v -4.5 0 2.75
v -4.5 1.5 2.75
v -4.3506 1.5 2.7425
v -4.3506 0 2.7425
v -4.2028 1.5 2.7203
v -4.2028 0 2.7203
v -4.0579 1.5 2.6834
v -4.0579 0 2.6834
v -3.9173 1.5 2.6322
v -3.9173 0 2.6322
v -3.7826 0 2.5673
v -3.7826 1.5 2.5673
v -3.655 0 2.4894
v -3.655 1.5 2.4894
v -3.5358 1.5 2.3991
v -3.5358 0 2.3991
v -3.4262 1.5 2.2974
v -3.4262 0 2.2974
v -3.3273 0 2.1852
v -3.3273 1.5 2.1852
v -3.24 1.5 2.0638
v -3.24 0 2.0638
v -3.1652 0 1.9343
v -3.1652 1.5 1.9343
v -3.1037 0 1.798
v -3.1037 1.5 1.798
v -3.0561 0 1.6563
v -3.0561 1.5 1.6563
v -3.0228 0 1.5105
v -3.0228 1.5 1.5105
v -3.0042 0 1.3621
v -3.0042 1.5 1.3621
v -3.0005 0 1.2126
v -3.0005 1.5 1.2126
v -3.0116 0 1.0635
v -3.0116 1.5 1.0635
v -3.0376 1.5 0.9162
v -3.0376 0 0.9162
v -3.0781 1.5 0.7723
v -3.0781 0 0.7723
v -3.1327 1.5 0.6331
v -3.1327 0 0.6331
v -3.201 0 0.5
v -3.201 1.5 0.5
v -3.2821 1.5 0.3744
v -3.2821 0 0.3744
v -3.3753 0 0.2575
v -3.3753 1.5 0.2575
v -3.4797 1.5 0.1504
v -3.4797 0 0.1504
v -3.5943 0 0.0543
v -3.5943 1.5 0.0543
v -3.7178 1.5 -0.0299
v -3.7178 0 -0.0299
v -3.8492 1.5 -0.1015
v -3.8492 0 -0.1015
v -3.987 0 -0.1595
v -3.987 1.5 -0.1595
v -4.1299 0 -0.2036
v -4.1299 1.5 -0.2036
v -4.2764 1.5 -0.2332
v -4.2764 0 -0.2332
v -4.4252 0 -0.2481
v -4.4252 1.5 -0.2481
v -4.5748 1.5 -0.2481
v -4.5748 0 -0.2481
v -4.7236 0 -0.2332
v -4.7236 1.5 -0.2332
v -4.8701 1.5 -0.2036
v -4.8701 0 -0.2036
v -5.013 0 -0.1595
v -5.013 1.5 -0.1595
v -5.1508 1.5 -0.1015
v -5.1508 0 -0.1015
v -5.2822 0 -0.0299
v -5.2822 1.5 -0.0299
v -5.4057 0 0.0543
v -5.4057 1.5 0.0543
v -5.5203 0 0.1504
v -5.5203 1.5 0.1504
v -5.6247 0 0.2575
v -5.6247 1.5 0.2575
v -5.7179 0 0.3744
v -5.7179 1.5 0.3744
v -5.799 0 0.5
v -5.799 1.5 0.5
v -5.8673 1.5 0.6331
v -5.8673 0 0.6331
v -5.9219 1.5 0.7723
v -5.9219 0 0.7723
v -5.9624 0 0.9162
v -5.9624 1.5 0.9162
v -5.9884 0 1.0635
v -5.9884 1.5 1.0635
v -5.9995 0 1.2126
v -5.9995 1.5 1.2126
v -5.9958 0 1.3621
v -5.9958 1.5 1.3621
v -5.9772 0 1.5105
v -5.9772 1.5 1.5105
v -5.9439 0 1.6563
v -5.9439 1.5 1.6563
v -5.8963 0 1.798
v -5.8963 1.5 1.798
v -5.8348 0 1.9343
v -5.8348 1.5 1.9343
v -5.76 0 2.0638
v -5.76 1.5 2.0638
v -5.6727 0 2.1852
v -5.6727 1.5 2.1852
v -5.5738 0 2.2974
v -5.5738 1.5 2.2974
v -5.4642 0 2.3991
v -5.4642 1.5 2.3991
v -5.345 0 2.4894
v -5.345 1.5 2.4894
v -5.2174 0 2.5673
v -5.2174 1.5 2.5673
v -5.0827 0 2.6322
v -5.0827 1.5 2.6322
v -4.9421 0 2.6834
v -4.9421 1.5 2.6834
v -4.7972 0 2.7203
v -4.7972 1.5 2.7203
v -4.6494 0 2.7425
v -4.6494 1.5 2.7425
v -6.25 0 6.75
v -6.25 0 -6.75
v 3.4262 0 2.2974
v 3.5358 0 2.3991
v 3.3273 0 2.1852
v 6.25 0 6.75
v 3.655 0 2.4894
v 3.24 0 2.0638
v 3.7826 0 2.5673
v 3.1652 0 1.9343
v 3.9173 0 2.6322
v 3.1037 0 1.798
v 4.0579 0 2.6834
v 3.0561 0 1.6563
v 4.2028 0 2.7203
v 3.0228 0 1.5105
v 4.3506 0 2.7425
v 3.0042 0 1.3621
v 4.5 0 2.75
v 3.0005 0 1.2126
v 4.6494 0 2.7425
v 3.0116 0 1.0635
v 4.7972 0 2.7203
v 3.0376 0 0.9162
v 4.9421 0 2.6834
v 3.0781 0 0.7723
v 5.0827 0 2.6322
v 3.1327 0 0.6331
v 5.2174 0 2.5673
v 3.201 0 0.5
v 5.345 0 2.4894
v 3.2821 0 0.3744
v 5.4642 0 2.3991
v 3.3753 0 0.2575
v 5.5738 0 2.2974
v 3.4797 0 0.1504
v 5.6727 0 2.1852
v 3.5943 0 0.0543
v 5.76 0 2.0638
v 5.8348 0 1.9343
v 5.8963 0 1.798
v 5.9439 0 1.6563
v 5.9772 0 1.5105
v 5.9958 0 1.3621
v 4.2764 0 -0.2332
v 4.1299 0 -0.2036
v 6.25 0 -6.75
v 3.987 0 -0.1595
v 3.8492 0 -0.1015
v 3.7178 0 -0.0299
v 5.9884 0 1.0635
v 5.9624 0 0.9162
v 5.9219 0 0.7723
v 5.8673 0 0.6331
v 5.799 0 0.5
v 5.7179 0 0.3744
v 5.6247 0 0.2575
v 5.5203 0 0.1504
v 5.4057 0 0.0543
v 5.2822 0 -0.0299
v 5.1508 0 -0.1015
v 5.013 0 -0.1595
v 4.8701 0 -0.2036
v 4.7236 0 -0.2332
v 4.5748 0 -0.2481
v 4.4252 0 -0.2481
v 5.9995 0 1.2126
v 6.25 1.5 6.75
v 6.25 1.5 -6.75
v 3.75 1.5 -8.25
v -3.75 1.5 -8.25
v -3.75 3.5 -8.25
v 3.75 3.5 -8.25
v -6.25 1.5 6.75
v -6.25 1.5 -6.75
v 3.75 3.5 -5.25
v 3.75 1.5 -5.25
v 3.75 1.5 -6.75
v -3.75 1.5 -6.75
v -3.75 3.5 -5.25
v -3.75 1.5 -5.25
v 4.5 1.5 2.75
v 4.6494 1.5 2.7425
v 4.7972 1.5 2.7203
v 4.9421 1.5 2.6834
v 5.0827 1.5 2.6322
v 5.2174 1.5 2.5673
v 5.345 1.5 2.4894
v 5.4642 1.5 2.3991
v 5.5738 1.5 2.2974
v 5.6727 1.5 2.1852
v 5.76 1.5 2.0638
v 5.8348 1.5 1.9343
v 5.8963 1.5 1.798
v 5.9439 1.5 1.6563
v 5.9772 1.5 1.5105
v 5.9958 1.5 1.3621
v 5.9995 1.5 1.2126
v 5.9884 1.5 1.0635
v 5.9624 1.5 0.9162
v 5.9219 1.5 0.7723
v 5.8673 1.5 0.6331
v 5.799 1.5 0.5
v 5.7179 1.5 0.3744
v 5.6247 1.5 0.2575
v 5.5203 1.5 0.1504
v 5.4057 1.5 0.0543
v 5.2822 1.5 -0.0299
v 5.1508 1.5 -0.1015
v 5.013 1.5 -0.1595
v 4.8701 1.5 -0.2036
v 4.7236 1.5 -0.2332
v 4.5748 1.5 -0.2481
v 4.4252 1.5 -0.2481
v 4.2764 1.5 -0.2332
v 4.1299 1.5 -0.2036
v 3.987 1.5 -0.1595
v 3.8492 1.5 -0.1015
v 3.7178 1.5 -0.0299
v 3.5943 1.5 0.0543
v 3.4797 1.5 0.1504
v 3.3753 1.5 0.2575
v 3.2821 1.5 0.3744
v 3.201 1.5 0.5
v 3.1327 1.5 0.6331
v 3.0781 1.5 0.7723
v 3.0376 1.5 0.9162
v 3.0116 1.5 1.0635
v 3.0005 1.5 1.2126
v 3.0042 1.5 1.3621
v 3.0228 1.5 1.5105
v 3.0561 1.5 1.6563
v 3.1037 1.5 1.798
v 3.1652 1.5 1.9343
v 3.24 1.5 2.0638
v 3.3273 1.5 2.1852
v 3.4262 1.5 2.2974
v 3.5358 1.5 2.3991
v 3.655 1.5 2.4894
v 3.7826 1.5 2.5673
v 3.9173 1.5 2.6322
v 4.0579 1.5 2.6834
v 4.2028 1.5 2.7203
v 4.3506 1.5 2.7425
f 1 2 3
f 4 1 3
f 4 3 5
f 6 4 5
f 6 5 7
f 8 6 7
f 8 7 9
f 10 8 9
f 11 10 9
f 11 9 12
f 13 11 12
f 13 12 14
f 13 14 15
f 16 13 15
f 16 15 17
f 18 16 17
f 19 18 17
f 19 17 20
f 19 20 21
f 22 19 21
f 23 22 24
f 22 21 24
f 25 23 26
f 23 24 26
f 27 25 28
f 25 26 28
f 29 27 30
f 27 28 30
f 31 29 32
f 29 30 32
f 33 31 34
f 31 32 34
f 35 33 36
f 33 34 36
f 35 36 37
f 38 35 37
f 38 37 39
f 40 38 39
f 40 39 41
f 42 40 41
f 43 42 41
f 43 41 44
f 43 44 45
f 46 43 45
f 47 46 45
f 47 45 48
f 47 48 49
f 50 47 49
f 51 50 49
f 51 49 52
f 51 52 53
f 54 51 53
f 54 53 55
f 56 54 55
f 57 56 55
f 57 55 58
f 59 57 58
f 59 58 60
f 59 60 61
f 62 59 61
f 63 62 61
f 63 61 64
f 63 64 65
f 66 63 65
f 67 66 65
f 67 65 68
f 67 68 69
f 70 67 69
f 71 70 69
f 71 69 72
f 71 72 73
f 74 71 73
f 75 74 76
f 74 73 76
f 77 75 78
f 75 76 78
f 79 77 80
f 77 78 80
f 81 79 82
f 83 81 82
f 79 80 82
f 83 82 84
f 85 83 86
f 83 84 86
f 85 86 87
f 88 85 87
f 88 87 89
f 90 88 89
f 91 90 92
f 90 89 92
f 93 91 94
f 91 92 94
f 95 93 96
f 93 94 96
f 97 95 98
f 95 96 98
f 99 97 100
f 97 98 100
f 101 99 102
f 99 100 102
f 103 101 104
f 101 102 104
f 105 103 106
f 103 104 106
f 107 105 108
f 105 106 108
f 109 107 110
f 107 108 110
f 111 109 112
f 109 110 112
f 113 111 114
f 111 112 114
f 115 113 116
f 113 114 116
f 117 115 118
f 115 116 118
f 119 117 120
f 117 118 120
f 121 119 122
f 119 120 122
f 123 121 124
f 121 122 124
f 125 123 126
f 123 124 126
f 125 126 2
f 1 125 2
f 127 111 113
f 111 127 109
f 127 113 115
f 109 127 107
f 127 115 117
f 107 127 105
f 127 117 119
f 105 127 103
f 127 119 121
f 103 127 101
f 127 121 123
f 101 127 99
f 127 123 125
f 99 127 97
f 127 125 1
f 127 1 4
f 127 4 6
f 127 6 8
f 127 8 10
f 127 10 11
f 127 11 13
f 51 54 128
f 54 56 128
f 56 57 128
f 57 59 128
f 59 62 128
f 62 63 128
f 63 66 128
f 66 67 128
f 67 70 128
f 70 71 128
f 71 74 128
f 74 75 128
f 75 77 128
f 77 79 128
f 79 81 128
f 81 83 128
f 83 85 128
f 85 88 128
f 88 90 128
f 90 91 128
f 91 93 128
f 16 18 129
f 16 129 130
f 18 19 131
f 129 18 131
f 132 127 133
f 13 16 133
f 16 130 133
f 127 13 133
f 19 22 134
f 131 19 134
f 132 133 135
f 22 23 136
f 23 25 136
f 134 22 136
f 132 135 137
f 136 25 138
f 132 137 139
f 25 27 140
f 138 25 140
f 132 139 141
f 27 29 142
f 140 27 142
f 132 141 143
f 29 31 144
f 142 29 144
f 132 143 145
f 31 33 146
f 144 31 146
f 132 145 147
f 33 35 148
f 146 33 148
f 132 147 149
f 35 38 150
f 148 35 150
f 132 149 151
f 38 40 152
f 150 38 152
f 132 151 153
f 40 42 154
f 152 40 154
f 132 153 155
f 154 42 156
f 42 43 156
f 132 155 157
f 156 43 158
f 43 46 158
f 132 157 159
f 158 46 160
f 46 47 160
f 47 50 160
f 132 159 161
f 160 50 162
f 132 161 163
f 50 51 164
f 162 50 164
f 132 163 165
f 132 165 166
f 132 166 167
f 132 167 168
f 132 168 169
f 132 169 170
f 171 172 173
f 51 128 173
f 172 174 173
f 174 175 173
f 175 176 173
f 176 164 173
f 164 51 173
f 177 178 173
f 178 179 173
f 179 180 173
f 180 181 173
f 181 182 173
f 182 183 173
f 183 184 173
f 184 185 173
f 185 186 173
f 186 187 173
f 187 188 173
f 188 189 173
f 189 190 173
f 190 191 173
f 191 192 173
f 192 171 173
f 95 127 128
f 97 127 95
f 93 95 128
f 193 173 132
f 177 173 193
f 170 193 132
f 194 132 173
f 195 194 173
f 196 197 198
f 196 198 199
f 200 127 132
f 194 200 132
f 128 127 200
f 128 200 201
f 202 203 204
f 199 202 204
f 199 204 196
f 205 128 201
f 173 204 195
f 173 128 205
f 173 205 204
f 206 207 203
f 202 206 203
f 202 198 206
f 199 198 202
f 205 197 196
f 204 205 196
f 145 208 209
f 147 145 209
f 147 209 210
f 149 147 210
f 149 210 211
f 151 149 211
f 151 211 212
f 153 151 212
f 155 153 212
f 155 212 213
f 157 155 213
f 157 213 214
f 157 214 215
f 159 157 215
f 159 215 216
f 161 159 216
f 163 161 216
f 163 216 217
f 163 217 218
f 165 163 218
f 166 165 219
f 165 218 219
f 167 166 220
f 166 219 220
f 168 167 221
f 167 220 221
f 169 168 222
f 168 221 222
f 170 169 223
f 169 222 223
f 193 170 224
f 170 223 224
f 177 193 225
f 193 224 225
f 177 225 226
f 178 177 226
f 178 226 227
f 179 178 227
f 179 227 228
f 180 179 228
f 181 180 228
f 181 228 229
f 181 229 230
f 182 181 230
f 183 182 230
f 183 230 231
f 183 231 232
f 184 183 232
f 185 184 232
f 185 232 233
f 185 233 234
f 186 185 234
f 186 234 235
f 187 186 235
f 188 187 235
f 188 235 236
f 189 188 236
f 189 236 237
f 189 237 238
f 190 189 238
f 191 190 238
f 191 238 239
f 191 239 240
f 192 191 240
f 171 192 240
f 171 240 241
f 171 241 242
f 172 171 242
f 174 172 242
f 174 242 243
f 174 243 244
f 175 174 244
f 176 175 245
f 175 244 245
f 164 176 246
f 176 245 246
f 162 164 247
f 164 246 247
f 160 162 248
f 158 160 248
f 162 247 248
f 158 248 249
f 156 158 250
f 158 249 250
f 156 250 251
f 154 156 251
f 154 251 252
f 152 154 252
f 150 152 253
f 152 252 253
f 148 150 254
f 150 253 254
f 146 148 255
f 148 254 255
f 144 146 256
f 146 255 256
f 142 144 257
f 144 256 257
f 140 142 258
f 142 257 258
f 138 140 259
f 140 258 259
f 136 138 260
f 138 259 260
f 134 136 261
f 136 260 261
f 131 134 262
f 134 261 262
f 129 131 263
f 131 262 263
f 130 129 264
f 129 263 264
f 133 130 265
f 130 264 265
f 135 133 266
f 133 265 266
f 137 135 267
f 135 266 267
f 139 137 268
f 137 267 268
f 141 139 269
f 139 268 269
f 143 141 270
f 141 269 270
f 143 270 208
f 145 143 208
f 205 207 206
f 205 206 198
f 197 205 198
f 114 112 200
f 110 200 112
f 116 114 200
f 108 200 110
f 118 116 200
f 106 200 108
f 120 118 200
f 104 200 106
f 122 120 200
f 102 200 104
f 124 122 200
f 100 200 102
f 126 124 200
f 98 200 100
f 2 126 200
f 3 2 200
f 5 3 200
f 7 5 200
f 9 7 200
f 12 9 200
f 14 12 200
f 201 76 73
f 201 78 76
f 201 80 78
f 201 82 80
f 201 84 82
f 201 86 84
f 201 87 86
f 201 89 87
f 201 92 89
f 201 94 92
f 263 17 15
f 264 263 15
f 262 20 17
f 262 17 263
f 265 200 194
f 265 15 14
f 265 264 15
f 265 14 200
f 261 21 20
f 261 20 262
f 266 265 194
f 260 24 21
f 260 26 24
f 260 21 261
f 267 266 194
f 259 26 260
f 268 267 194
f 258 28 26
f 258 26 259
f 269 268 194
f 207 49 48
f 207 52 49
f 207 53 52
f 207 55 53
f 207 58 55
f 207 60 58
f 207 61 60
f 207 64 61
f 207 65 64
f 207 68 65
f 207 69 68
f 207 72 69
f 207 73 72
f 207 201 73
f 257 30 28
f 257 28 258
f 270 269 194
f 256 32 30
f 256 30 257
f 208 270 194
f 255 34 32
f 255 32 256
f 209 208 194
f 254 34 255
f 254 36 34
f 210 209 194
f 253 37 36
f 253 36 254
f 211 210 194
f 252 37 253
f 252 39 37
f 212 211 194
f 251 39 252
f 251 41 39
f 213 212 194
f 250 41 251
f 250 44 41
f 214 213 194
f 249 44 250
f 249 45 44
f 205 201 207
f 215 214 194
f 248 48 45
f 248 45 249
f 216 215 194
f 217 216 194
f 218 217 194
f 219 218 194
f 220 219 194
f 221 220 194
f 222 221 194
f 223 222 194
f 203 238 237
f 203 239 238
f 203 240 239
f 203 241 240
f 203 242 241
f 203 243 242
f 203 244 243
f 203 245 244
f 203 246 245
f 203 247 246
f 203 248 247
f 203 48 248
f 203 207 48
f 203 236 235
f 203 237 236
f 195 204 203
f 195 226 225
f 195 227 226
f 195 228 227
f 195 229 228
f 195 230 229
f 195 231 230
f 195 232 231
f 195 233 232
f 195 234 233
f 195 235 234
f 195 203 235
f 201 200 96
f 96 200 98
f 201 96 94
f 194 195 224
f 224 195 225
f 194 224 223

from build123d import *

# Parameters (mm, degrees)
SKETCH1_W           = 12.5
SKETCH1_H           = 13.5
BOSS_EXTRUDE1_DEPTH = 1.5
SKETCH2_W           = 7.5
SKETCH2_H           = 3
BOSS_EXTRUDE2_DEPTH = 2
SKETCH3_R           = 1.5
CUT_EXTRUDE4_DEPTH  = 11.541584321


with BuildPart() as part:
    # Sketch1 → Boss-Extrude1 (new body)
    with BuildSketch(Plane(origin=(0, 0, 0), x_dir=(1, 0, 0), z_dir=(0, 1, 0))):
        Rectangle(SKETCH1_W, SKETCH1_H)
    extrude(amount=BOSS_EXTRUDE1_DEPTH)

    # Sketch2 → Boss-Extrude2 (add)
    with BuildSketch(Plane(origin=(0, 1.5, 0), x_dir=(1, 0, 0), z_dir=(0, 1, 0))):
        with Locations((0, 6.75)):
            Rectangle(SKETCH2_W, SKETCH2_H)
    extrude(amount=BOSS_EXTRUDE2_DEPTH)

    # Sketch3 → Cut-Extrude4 (cut, through all)
    with BuildSketch(Plane(origin=(0, 1.5, 0), x_dir=(1, 0, 0), z_dir=(0, 1, 0))):
        with Locations(Location((-4.5, -1.25, 0), (0, 0, 270))):
            Circle(SKETCH3_R)
        with Locations(Location((4.5, -1.25, 0), (0, 0, 270))):
            Circle(SKETCH3_R)
    extrude(amount=-CUT_EXTRUDE4_DEPTH, mode=Mode.SUBTRACT)


solid = part.part
